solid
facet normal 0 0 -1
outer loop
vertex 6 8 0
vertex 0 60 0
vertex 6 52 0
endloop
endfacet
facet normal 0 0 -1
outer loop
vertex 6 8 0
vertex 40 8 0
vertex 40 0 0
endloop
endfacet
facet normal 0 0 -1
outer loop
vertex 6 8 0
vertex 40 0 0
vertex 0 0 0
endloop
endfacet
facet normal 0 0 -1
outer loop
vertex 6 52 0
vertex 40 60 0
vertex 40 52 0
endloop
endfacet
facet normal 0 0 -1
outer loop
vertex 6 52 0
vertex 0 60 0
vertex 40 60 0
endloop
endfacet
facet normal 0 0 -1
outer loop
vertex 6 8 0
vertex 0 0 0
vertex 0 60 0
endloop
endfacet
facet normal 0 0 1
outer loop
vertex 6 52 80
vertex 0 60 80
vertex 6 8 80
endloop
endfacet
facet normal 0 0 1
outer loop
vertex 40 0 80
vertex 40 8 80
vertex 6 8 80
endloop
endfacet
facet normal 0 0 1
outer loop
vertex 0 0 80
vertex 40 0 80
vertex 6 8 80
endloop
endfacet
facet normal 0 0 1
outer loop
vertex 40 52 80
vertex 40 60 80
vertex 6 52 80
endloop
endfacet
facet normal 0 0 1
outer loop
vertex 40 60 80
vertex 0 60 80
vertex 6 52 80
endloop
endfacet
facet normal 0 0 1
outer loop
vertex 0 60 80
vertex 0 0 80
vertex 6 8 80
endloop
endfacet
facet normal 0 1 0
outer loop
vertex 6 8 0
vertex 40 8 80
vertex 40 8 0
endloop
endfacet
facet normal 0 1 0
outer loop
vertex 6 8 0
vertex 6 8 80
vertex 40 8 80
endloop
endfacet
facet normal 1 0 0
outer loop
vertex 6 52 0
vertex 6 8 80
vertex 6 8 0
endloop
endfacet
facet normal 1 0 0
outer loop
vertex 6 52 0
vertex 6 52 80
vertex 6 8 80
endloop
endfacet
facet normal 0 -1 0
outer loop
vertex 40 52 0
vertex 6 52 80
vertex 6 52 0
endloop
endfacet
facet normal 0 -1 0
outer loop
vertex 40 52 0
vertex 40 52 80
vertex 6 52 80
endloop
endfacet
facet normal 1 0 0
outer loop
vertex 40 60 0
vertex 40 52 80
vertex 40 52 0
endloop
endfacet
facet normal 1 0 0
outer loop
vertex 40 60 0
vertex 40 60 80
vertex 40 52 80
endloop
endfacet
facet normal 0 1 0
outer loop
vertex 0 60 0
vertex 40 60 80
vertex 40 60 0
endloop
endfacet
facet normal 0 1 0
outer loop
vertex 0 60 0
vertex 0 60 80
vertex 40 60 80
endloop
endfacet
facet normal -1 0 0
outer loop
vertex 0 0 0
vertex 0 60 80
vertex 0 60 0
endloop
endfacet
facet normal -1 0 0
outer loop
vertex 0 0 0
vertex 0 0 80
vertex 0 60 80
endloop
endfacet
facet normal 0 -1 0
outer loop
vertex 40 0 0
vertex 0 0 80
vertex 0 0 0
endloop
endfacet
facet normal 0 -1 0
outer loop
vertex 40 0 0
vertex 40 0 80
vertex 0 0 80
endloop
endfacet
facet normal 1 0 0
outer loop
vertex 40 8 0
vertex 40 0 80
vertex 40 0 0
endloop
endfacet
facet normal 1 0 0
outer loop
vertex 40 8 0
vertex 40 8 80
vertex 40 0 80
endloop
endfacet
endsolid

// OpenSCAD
$fn = 32;

// ----------------------------------------------------------------------
// Structural section: channel 40 x 60 mm
// ----------------------------------------------------------------------

// --- parameters (mm) ---
sec_w = 40;               // channel width, X
sec_h = 60;               // channel height, Y
flange_t = 8;             // flange thickness
web_t = 6;                // web thickness
plate_t = 80;             // cut length, Z (extrusion height)

profile = [[0, 0], [40, 0], [40, 8], [6, 8], [6, 52], [40, 52], [40, 60], [0, 60]];  // primary outline, 8 points, counter clockwise

// --- the one profile operation ---
linear_extrude(height = plate_t) polygon(points = profile);
